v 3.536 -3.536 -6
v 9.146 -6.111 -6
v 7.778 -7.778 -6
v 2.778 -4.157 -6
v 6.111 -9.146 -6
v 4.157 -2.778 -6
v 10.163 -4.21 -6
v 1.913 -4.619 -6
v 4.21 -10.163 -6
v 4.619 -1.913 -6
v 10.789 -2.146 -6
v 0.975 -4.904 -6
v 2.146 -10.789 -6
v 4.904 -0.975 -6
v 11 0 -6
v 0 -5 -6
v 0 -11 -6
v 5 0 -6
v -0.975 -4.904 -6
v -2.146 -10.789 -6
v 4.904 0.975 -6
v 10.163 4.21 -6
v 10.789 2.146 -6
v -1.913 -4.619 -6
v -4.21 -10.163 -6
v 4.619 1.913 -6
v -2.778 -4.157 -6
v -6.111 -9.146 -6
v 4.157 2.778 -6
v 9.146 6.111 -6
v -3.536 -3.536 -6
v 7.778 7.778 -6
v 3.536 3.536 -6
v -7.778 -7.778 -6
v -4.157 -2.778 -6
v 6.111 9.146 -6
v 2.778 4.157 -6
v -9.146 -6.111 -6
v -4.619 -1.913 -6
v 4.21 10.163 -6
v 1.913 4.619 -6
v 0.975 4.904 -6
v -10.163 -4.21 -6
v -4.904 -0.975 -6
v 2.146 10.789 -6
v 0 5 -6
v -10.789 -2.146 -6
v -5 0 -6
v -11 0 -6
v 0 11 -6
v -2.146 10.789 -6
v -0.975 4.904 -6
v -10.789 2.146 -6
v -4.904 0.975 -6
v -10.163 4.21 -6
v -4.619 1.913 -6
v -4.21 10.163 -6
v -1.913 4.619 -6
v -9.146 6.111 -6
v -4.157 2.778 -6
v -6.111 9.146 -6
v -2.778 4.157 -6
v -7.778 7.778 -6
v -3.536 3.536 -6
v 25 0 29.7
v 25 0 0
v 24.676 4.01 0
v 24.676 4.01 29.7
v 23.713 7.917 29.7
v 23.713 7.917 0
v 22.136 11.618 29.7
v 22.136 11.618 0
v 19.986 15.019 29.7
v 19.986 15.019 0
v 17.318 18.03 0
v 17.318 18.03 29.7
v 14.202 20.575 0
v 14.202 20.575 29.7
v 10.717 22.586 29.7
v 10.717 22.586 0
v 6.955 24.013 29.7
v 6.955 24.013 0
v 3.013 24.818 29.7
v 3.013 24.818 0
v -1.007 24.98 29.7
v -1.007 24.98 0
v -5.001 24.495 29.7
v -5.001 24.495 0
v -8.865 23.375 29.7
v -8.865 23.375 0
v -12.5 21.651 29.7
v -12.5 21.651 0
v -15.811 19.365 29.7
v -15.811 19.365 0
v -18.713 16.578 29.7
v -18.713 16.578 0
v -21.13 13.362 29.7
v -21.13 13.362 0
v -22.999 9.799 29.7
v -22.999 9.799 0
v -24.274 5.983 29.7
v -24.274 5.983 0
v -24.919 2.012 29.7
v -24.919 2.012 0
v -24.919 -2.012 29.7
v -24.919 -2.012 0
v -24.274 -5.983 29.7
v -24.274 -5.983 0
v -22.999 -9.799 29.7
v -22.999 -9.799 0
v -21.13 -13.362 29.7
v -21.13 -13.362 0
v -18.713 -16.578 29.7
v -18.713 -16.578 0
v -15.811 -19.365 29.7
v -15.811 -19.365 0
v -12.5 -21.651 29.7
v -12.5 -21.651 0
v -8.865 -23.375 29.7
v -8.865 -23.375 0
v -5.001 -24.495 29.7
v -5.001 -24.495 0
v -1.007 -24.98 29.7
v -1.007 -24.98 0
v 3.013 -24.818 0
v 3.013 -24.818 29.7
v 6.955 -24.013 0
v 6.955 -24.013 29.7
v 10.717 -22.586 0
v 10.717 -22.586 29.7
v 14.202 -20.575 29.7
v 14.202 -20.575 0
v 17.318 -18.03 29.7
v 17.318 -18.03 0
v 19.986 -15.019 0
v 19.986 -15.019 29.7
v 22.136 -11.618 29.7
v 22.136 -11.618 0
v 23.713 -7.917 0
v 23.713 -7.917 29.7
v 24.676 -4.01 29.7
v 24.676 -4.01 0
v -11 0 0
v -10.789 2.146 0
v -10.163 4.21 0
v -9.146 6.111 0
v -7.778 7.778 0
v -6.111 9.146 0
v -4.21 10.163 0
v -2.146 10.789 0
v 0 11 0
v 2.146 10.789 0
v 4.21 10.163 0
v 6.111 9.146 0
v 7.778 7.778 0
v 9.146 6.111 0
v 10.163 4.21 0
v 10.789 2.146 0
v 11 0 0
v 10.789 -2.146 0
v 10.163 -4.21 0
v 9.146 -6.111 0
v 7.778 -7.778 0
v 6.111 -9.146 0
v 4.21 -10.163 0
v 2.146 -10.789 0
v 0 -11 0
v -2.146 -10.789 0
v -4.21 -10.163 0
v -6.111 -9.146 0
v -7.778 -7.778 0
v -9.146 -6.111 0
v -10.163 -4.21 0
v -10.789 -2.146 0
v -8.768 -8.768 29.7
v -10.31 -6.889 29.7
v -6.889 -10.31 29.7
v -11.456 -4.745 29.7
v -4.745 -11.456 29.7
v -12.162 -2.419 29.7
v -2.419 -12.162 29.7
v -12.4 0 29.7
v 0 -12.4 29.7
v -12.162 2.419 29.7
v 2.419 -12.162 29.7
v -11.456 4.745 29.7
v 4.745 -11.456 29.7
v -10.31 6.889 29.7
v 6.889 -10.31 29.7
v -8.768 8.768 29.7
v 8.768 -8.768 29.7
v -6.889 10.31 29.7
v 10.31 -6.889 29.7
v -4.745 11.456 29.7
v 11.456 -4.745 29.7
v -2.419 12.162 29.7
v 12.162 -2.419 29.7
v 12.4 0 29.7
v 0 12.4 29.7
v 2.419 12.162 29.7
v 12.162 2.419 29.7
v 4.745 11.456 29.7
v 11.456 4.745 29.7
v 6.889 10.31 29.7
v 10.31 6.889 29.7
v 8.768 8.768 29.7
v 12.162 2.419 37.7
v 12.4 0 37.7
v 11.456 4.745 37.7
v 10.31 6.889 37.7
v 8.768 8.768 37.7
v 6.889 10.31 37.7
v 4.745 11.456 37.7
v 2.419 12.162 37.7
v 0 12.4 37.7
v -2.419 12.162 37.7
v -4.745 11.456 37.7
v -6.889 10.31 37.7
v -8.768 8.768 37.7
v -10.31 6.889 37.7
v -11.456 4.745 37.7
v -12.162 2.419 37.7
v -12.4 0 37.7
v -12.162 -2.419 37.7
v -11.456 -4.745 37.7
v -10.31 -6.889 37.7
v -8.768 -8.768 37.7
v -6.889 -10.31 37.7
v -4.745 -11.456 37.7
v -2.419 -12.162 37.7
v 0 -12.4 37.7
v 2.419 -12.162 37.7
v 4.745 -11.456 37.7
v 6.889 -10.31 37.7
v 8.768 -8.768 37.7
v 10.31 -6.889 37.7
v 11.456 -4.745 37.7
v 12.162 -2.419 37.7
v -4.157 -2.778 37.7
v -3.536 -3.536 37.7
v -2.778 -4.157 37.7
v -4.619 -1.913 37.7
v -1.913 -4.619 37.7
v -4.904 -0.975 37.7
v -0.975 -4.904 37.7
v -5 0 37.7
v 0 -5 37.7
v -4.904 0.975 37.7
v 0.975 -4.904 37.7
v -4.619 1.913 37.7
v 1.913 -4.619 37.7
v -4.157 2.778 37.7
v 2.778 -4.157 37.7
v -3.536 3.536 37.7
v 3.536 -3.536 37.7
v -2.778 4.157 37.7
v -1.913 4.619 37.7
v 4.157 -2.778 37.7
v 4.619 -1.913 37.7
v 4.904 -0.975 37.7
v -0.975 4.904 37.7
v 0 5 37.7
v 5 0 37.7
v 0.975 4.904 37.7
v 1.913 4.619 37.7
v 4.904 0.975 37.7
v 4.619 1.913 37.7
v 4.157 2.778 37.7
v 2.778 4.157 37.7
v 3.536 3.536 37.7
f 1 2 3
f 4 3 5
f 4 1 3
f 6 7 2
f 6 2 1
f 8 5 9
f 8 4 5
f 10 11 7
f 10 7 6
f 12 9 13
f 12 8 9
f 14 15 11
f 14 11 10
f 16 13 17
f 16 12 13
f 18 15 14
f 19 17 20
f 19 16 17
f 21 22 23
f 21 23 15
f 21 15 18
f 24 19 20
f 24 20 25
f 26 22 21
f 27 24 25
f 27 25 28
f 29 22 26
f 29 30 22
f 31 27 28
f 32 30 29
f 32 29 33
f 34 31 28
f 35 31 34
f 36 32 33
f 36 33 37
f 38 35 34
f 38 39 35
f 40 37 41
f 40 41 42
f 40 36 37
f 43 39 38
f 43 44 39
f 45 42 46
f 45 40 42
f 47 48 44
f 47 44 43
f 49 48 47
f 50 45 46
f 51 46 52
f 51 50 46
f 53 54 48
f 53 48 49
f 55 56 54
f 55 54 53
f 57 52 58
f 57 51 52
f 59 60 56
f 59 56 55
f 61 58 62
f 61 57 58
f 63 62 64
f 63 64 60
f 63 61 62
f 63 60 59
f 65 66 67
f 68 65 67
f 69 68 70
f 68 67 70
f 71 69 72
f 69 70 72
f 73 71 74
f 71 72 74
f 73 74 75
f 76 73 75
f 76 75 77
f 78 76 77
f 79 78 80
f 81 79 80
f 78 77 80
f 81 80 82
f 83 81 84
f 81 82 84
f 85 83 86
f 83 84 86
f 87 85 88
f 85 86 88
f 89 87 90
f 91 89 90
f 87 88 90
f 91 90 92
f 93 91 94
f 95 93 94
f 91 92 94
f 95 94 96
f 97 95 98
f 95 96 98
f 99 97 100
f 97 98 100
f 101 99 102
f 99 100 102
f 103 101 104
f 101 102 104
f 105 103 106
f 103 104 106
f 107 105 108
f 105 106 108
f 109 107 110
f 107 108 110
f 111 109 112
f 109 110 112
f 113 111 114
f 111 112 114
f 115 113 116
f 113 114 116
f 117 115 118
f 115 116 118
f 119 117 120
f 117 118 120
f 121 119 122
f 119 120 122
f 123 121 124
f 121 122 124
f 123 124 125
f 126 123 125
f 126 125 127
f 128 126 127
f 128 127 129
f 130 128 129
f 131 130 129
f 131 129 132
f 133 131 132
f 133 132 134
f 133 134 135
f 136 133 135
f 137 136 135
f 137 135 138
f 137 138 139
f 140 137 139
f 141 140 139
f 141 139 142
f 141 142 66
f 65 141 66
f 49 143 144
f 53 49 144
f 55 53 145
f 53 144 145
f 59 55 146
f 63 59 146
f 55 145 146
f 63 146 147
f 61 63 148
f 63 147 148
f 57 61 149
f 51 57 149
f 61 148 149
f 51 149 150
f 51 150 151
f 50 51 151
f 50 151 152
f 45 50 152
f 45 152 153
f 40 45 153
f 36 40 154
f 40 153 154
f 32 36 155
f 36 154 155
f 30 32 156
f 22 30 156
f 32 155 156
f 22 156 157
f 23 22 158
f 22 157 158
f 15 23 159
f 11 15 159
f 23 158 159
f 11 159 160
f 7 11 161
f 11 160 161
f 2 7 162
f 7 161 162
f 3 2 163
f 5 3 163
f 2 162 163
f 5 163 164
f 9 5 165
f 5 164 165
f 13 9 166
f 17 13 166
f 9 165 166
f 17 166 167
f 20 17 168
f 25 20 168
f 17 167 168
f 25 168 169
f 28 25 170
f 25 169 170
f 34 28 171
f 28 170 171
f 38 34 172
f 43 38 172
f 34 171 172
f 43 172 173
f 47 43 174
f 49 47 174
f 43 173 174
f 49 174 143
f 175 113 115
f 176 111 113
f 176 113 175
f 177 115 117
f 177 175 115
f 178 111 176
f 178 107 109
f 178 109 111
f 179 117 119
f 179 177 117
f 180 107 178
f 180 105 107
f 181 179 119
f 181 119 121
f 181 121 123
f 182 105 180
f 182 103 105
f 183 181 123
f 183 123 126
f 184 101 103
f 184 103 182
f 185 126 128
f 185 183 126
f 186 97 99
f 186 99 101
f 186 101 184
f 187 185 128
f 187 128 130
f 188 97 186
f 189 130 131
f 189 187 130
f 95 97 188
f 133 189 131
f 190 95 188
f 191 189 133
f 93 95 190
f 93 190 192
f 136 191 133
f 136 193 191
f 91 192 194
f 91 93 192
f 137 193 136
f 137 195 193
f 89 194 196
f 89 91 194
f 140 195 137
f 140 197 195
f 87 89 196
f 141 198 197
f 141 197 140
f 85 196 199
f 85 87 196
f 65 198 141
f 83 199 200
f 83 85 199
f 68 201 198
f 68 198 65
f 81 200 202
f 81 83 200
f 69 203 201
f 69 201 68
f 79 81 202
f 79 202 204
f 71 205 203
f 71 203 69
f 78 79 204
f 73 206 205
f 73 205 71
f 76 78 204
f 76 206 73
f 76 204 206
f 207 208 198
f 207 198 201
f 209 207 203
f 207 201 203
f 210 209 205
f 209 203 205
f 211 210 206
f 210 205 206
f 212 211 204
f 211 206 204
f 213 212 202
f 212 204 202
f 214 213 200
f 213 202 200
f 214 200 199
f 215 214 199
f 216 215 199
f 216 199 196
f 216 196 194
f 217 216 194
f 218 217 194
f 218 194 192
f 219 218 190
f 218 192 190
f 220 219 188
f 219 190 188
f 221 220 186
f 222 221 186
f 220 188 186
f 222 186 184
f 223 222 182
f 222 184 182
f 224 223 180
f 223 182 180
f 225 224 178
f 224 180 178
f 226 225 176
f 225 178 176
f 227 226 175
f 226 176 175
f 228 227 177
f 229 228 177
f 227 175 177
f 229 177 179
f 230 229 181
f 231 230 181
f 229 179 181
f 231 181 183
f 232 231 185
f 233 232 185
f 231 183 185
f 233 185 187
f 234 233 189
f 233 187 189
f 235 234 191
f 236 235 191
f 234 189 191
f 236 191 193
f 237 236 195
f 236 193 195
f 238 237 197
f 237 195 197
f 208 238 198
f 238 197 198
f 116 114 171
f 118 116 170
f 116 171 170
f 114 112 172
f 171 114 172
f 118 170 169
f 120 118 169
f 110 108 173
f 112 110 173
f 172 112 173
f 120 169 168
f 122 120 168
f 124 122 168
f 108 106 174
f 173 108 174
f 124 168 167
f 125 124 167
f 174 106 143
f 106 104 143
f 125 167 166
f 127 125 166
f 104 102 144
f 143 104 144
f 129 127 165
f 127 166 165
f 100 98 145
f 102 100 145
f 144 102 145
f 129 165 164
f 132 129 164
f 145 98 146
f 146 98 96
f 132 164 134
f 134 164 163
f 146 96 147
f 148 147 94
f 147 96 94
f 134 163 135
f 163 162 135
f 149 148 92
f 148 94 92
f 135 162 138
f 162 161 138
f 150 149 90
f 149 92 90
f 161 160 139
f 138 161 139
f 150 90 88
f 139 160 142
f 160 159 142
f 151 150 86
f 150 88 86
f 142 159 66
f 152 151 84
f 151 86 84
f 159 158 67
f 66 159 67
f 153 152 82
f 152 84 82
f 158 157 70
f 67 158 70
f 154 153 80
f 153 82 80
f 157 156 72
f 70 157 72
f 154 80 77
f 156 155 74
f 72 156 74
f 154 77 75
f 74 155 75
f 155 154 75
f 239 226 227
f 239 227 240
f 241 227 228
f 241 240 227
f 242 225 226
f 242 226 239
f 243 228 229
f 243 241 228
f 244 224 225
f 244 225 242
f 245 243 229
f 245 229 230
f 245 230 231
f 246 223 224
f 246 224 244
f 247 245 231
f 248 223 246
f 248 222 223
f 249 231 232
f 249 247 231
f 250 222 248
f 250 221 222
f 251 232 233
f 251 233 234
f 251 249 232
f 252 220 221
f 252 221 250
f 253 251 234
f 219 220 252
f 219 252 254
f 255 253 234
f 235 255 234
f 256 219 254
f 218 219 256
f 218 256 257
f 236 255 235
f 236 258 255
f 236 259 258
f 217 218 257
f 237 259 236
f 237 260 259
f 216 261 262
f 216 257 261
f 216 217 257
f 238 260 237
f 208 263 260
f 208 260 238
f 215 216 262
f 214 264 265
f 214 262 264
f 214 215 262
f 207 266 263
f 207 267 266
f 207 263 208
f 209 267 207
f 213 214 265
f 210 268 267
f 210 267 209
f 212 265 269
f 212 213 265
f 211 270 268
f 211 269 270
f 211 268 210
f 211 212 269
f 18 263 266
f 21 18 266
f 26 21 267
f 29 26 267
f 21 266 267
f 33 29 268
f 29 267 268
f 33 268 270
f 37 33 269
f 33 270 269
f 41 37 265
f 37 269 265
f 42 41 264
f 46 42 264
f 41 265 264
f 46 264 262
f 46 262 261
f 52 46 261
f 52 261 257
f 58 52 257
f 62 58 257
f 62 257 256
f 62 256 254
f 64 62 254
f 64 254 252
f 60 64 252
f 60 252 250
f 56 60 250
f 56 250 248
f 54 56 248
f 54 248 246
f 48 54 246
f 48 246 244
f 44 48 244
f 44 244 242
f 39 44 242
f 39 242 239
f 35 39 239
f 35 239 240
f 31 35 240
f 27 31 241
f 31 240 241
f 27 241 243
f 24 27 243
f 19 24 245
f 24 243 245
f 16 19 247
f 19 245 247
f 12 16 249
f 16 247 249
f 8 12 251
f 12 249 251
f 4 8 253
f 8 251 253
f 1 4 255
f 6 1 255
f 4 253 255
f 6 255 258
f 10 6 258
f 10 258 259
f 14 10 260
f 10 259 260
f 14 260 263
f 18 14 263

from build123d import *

# Parameters (mm, degrees)
IZIM1_R                     = 25
Y_KSEKLIK_EKSTR_ZYON1_DEPTH = 29.7
IZIM2_R                     = 11
Y_KSEKLIK_EKSTR_ZYON2_DEPTH = 6
IZIM3_R                     = 12.4
Y_KSEKLIK_EKSTR_ZYON3_DEPTH = 8
IZIM4_R                     = 5
KES_EKSTR_ZYON1_DEPTH       = 57.211119896


with BuildPart() as part:
    # Çizim1 → Yükseklik-Ekstrüzyon1 (new body)
    with BuildSketch(Plane.XY):
        Circle(IZIM1_R)
    extrude(amount=Y_KSEKLIK_EKSTR_ZYON1_DEPTH)

    # Çizim2 → Yükseklik-Ekstrüzyon2 (add)
    with BuildSketch(Plane(origin=(0, 0, 0), x_dir=(-1, 0, 0), z_dir=(0, 0, -1))):
        Circle(IZIM2_R)
    extrude(amount=Y_KSEKLIK_EKSTR_ZYON2_DEPTH)

    # Çizim3 → Yükseklik-Ekstrüzyon3 (add)
    with BuildSketch(Plane.XY.offset(29.7)):
        Circle(IZIM3_R)
    extrude(amount=Y_KSEKLIK_EKSTR_ZYON3_DEPTH)

    # Çizim4 → Kes-Ekstrüzyon1 (cut, through all)
    with BuildSketch(Plane.XY.offset(37.7)):
        Circle(IZIM4_R)
    extrude(amount=-KES_EKSTR_ZYON1_DEPTH, mode=Mode.SUBTRACT)


solid = part.part
